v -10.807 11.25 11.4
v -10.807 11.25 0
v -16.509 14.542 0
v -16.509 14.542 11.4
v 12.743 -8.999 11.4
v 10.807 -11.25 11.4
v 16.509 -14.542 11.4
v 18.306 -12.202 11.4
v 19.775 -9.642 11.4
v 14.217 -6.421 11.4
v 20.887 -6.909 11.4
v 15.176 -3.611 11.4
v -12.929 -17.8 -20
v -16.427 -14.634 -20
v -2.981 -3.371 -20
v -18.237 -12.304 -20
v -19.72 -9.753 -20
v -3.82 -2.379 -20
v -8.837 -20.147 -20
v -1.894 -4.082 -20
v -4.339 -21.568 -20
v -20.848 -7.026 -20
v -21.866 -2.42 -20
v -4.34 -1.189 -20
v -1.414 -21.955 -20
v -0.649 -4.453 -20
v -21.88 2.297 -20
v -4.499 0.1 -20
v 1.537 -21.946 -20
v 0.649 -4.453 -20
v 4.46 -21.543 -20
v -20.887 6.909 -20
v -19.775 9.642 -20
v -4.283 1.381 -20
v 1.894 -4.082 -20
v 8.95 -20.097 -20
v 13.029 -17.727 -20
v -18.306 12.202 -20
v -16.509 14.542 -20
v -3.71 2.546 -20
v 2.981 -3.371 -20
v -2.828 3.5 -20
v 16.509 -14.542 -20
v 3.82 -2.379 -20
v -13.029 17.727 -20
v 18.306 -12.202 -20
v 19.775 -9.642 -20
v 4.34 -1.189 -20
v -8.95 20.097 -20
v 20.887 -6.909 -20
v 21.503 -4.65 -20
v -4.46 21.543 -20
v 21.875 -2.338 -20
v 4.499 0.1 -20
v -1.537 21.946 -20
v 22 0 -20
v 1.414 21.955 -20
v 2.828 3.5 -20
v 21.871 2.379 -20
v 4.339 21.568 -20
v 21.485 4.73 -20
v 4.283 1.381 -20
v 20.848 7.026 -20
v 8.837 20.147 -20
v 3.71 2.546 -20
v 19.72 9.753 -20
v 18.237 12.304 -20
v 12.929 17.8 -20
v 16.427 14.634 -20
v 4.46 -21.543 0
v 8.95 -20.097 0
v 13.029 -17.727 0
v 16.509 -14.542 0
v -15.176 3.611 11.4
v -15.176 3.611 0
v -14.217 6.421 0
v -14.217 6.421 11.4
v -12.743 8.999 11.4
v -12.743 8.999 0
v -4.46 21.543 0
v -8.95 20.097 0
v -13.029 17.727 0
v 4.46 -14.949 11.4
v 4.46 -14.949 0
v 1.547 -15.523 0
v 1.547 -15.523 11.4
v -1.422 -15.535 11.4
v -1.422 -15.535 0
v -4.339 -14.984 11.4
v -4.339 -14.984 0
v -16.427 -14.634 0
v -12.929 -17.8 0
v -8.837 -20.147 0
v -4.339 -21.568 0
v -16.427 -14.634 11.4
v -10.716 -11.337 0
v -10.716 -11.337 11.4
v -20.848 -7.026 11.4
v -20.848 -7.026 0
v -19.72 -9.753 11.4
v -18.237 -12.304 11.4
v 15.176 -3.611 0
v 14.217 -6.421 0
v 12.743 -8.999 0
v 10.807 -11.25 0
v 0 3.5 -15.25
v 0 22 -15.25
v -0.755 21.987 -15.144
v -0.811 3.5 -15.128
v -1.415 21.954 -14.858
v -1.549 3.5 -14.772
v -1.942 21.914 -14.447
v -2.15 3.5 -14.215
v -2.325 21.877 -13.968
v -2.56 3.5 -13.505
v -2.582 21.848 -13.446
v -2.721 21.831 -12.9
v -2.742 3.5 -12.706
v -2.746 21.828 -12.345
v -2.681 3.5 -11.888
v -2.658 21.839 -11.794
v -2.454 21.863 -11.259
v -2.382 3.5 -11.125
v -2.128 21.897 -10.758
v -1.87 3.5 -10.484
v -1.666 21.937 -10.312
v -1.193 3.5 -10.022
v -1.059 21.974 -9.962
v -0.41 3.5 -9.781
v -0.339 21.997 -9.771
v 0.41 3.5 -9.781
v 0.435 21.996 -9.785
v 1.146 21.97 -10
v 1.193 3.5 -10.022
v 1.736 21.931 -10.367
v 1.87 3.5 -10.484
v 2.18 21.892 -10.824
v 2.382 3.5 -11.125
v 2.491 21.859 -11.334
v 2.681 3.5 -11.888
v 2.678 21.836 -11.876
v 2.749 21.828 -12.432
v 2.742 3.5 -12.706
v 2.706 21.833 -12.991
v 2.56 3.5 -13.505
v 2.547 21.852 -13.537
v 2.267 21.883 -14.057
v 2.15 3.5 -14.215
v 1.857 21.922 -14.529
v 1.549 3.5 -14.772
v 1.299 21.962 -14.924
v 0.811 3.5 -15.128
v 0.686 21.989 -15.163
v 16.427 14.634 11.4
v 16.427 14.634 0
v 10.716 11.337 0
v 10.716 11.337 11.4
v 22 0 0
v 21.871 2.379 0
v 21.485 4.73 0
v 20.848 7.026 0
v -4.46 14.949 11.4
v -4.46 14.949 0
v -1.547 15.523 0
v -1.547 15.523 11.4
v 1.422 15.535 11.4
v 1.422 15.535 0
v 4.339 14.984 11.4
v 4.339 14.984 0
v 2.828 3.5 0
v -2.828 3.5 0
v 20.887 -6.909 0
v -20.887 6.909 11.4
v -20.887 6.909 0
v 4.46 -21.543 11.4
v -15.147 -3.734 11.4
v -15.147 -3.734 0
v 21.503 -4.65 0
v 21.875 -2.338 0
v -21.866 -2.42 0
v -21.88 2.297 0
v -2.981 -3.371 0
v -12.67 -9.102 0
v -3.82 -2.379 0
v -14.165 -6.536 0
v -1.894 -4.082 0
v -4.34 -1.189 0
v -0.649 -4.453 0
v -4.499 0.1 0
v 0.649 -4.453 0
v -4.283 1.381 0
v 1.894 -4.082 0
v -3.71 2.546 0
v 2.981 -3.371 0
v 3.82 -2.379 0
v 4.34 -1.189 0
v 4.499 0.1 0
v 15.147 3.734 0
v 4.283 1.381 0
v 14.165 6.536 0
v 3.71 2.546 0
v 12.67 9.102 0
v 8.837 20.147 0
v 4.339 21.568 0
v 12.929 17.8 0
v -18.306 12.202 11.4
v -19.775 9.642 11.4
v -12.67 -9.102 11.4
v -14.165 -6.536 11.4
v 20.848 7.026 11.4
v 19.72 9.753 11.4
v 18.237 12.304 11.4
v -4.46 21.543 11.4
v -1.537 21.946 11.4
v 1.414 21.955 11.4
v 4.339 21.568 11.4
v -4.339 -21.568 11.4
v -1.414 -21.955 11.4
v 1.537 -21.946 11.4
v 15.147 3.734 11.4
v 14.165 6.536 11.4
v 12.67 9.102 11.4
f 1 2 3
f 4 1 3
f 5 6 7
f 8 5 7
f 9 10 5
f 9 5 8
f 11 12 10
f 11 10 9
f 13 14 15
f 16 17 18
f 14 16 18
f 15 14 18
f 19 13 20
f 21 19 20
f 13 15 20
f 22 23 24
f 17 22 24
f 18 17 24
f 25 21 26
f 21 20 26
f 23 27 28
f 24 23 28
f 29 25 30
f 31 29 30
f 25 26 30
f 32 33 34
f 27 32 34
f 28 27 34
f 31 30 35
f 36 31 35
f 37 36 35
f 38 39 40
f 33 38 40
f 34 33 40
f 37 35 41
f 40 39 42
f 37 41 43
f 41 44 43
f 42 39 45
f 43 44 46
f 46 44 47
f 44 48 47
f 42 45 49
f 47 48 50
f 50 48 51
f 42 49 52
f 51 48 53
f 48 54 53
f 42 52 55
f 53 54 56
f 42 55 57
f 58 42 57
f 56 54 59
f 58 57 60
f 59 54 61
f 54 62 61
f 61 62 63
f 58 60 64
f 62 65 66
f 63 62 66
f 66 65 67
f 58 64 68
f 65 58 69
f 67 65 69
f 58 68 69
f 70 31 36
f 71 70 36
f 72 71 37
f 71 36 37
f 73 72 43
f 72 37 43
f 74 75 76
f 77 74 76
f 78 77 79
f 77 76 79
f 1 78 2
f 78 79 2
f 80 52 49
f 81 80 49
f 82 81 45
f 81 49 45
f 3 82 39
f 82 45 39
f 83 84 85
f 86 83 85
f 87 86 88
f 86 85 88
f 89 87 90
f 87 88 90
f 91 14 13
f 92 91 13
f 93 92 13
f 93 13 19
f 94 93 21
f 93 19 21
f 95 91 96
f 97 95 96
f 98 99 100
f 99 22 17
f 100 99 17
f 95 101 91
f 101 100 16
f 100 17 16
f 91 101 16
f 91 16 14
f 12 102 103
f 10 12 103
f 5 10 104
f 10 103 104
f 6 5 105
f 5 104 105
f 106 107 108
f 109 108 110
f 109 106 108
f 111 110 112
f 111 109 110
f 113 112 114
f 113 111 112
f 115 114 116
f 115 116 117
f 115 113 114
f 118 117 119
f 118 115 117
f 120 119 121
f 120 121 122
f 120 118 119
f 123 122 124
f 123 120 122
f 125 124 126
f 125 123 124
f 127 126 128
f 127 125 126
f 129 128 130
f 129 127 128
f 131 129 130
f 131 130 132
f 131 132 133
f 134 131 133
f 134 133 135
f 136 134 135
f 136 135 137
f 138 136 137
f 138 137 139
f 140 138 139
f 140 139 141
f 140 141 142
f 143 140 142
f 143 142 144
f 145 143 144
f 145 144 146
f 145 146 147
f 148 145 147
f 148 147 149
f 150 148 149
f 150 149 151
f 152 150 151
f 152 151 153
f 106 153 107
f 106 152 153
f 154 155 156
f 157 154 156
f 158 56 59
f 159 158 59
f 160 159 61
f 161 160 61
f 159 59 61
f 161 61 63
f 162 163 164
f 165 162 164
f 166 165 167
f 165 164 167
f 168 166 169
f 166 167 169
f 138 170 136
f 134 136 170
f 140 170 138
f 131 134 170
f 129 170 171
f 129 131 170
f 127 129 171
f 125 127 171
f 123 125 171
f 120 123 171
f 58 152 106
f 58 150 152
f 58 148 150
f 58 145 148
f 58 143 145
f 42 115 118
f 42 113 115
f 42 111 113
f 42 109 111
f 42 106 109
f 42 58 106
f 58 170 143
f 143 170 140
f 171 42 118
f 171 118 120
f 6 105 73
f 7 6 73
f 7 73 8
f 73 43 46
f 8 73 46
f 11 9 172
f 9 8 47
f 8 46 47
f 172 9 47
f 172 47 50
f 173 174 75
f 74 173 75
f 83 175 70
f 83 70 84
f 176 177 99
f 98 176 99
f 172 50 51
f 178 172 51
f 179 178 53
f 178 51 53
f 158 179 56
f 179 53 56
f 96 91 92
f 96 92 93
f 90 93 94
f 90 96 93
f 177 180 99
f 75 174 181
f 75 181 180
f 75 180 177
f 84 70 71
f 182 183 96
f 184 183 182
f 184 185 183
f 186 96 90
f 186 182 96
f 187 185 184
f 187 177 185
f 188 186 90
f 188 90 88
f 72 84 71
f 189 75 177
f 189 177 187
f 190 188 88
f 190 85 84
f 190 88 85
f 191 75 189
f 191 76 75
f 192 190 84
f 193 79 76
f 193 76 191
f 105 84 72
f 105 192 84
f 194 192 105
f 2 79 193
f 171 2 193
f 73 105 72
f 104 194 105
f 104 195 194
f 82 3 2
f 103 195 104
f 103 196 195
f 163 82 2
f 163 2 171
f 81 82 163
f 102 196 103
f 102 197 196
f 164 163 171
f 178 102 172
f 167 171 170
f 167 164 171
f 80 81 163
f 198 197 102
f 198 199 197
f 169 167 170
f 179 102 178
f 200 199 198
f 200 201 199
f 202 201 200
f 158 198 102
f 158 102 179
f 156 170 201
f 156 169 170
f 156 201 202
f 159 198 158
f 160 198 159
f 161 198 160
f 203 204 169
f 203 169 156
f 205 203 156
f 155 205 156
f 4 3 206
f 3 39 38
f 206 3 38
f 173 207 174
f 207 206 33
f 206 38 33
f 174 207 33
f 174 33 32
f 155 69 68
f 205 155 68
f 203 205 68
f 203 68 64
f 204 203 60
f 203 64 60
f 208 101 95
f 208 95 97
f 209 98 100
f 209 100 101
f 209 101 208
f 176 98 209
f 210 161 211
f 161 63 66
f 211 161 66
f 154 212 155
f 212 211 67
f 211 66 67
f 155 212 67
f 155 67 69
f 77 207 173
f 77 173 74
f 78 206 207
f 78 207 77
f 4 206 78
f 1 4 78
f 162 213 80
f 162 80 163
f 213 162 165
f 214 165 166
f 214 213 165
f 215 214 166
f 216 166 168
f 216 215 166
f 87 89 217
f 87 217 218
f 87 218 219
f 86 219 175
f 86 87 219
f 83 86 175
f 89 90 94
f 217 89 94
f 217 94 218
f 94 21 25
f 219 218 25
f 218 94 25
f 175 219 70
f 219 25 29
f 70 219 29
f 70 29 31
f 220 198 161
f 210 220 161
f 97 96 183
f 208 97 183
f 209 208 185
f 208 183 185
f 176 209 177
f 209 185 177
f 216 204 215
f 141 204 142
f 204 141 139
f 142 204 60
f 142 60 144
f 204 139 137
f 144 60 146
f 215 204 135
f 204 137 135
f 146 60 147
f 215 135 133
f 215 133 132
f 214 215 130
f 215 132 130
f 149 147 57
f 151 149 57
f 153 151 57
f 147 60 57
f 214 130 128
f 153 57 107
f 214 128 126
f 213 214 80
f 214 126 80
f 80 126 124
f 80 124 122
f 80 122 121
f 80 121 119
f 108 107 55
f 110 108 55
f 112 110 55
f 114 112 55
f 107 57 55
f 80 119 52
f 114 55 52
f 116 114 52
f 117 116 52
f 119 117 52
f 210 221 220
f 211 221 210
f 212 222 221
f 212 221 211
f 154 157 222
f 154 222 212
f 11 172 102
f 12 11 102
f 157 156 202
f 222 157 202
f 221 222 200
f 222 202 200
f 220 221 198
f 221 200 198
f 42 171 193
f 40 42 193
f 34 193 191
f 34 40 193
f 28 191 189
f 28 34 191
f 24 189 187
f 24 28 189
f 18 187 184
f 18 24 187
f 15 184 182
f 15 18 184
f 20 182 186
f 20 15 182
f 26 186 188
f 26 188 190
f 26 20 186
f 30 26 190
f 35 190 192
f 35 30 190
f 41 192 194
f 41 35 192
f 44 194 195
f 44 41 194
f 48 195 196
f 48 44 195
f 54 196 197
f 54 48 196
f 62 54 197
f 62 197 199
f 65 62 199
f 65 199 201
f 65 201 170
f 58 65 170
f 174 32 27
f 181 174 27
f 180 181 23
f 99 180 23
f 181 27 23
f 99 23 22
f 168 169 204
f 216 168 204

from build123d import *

# Parameters (mm, degrees)
BOSS_EXTRUDE1_DEPTH   = 11.4
BOSS_EXTRUDE1_2_DEPTH = 11.4
BOSS_EXTRUDE1_3_DEPTH = 11.4
BOSS_EXTRUDE1_4_DEPTH = 11.4
BOSS_EXTRUDE1_5_DEPTH = 11.4
BOSS_EXTRUDE1_6_DEPTH = 11.4
BOSS_EXTRUDE2_START   = -20
SKETCH1_6_R           = 22
BOSS_EXTRUDE2_DEPTH   = 20
SKETCH2_R             = 2.75
CUT_EXTRUDE1_DEPTH    = 30


with BuildPart() as part:
    # Sketch1 → Boss-Extrude1 (new body)
    with BuildSketch(Plane.XY):
        with BuildLine():
            ThreePointArc((-4.460468257, 14.948719776), (-0.063074903, 15.599872485), (4.339440194, 14.984300411))
            Line((4.339440194, 14.984300411), (4.339440194, 21.56778289))
            ThreePointArc((4.339440194, 21.56778289), (-0.061761858, 21.999913306), (-4.460468257, 21.543078307))
            Line((-4.460468257, 21.543078307), (-4.460468257, 14.948719776))
        make_face()
    extrude(amount=BOSS_EXTRUDE1_DEPTH)



with BuildPart() as body_2:
    # Sketch1 → Boss-Extrude1 2 (new body)
    with BuildSketch(Plane.XY):
        with BuildLine():
            Line((16.426618961, 14.634417977), (10.715736951, 11.337238711))
            ThreePointArc((10.715736951, 11.337238711), (13.478348416, 7.854560711), (15.146504911, 3.734084759))
            Line((15.146504911, 3.734084759), (20.847967983, 7.025825999))
            ThreePointArc((20.847967983, 7.025825999), (19.021602875, 11.053443991), (16.426618961, 14.634417977))
        make_face()
    extrude(amount=BOSS_EXTRUDE1_2_DEPTH)


with BuildPart() as body_3:
    # Sketch1 → Boss-Extrude1 3 (new body)
    with BuildSketch(Plane.XY):
        with BuildLine():
            ThreePointArc((-15.176205208, 3.611481064), (-13.54142332, 7.745311774), (-10.807064717, 11.250215651))
            Line((-10.807064717, 11.250215651), (-16.508527789, 14.541956891))
            ThreePointArc((-16.508527789, 14.541956891), (-19.083364733, 10.946469315), (-20.887087218, 6.90866033))
            Line((-20.887087218, 6.90866033), (-15.176205208, 3.611481064))
        make_face()
    extrude(amount=BOSS_EXTRUDE1_3_DEPTH)


with BuildPart() as body_4:
    # Sketch1 → Boss-Extrude1 4 (new body)
    with BuildSketch(Plane.XY):
        with BuildLine():
            Line((20.887087218, -6.90866033), (15.176205208, -3.611481064))
            ThreePointArc((15.176205208, -3.611481064), (13.54142332, -7.745311774), (10.807064717, -11.250215651))
            Line((10.807064717, -11.250215651), (16.508527789, -14.541956891))
            ThreePointArc((16.508527789, -14.541956891), (19.083364733, -10.946469315), (20.887087218, -6.90866033))
        make_face()
    extrude(amount=BOSS_EXTRUDE1_4_DEPTH)


with BuildPart() as body_5:
    # Sketch1 → Boss-Extrude1 5 (new body)
    with BuildSketch(Plane.XY):
        with BuildLine():
            ThreePointArc((-10.715736951, -11.337238711), (-13.478348416, -7.854560711), (-15.146504911, -3.734084759))
            Line((-15.146504911, -3.734084759), (-20.847967983, -7.025825999))
            ThreePointArc((-20.847967983, -7.025825999), (-19.021602875, -11.053443991), (-16.426618961, -14.634417977))
            Line((-16.426618961, -14.634417977), (-10.715736951, -11.337238711))
        make_face()
    extrude(amount=BOSS_EXTRUDE1_5_DEPTH)


with BuildPart() as body_6:
    # Sketch1 → Boss-Extrude1 6 (new body)
    with BuildSketch(Plane.XY):
        with BuildLine():
            Line((4.460468257, -21.543078307), (4.460468257, -14.948719776))
            ThreePointArc((4.460468257, -14.948719776), (0.063074903, -15.599872485), (-4.339440194, -14.984300411))
            Line((-4.339440194, -14.984300411), (-4.339440194, -21.56778289))
            ThreePointArc((-4.339440194, -21.56778289), (0.061761858, -21.999913306), (4.460468257, -21.543078307))
        make_face()
    extrude(amount=BOSS_EXTRUDE1_6_DEPTH)


with BuildPart() as part_1:
    add(part.part)

    add(body_2.part)  # Boss-Extrude2 merges body 2

    add(body_3.part)  # Boss-Extrude2 merges body 3

    add(body_4.part)  # Boss-Extrude2 merges body 4

    add(body_5.part)  # Boss-Extrude2 merges body 5

    add(body_6.part)  # Boss-Extrude2 merges body 6
    # Sketch1<6> → Boss-Extrude2 (add)
    with BuildSketch(Plane.XY.offset(BOSS_EXTRUDE2_START)):
        Circle(SKETCH1_6_R)
        with BuildLine():
            Line((-2.828427125, 3.5), (2.828427125, 3.5))
            ThreePointArc((2.828427125, 3.5), (0, -4.5), (-2.828427125, 3.5))
        make_face(mode=Mode.SUBTRACT)
    extrude(amount=BOSS_EXTRUDE2_DEPTH)

    # Sketch2 → Cut-Extrude1 (cut)
    with BuildSketch(Plane(origin=(0, 0, 0), x_dir=(1, 0, 0), z_dir=(0, 1, 0))):
        with Locations((0, 12.5)):
            Circle(SKETCH2_R)
    extrude(amount=CUT_EXTRUDE1_DEPTH, mode=Mode.SUBTRACT)


solid = part_1.part
